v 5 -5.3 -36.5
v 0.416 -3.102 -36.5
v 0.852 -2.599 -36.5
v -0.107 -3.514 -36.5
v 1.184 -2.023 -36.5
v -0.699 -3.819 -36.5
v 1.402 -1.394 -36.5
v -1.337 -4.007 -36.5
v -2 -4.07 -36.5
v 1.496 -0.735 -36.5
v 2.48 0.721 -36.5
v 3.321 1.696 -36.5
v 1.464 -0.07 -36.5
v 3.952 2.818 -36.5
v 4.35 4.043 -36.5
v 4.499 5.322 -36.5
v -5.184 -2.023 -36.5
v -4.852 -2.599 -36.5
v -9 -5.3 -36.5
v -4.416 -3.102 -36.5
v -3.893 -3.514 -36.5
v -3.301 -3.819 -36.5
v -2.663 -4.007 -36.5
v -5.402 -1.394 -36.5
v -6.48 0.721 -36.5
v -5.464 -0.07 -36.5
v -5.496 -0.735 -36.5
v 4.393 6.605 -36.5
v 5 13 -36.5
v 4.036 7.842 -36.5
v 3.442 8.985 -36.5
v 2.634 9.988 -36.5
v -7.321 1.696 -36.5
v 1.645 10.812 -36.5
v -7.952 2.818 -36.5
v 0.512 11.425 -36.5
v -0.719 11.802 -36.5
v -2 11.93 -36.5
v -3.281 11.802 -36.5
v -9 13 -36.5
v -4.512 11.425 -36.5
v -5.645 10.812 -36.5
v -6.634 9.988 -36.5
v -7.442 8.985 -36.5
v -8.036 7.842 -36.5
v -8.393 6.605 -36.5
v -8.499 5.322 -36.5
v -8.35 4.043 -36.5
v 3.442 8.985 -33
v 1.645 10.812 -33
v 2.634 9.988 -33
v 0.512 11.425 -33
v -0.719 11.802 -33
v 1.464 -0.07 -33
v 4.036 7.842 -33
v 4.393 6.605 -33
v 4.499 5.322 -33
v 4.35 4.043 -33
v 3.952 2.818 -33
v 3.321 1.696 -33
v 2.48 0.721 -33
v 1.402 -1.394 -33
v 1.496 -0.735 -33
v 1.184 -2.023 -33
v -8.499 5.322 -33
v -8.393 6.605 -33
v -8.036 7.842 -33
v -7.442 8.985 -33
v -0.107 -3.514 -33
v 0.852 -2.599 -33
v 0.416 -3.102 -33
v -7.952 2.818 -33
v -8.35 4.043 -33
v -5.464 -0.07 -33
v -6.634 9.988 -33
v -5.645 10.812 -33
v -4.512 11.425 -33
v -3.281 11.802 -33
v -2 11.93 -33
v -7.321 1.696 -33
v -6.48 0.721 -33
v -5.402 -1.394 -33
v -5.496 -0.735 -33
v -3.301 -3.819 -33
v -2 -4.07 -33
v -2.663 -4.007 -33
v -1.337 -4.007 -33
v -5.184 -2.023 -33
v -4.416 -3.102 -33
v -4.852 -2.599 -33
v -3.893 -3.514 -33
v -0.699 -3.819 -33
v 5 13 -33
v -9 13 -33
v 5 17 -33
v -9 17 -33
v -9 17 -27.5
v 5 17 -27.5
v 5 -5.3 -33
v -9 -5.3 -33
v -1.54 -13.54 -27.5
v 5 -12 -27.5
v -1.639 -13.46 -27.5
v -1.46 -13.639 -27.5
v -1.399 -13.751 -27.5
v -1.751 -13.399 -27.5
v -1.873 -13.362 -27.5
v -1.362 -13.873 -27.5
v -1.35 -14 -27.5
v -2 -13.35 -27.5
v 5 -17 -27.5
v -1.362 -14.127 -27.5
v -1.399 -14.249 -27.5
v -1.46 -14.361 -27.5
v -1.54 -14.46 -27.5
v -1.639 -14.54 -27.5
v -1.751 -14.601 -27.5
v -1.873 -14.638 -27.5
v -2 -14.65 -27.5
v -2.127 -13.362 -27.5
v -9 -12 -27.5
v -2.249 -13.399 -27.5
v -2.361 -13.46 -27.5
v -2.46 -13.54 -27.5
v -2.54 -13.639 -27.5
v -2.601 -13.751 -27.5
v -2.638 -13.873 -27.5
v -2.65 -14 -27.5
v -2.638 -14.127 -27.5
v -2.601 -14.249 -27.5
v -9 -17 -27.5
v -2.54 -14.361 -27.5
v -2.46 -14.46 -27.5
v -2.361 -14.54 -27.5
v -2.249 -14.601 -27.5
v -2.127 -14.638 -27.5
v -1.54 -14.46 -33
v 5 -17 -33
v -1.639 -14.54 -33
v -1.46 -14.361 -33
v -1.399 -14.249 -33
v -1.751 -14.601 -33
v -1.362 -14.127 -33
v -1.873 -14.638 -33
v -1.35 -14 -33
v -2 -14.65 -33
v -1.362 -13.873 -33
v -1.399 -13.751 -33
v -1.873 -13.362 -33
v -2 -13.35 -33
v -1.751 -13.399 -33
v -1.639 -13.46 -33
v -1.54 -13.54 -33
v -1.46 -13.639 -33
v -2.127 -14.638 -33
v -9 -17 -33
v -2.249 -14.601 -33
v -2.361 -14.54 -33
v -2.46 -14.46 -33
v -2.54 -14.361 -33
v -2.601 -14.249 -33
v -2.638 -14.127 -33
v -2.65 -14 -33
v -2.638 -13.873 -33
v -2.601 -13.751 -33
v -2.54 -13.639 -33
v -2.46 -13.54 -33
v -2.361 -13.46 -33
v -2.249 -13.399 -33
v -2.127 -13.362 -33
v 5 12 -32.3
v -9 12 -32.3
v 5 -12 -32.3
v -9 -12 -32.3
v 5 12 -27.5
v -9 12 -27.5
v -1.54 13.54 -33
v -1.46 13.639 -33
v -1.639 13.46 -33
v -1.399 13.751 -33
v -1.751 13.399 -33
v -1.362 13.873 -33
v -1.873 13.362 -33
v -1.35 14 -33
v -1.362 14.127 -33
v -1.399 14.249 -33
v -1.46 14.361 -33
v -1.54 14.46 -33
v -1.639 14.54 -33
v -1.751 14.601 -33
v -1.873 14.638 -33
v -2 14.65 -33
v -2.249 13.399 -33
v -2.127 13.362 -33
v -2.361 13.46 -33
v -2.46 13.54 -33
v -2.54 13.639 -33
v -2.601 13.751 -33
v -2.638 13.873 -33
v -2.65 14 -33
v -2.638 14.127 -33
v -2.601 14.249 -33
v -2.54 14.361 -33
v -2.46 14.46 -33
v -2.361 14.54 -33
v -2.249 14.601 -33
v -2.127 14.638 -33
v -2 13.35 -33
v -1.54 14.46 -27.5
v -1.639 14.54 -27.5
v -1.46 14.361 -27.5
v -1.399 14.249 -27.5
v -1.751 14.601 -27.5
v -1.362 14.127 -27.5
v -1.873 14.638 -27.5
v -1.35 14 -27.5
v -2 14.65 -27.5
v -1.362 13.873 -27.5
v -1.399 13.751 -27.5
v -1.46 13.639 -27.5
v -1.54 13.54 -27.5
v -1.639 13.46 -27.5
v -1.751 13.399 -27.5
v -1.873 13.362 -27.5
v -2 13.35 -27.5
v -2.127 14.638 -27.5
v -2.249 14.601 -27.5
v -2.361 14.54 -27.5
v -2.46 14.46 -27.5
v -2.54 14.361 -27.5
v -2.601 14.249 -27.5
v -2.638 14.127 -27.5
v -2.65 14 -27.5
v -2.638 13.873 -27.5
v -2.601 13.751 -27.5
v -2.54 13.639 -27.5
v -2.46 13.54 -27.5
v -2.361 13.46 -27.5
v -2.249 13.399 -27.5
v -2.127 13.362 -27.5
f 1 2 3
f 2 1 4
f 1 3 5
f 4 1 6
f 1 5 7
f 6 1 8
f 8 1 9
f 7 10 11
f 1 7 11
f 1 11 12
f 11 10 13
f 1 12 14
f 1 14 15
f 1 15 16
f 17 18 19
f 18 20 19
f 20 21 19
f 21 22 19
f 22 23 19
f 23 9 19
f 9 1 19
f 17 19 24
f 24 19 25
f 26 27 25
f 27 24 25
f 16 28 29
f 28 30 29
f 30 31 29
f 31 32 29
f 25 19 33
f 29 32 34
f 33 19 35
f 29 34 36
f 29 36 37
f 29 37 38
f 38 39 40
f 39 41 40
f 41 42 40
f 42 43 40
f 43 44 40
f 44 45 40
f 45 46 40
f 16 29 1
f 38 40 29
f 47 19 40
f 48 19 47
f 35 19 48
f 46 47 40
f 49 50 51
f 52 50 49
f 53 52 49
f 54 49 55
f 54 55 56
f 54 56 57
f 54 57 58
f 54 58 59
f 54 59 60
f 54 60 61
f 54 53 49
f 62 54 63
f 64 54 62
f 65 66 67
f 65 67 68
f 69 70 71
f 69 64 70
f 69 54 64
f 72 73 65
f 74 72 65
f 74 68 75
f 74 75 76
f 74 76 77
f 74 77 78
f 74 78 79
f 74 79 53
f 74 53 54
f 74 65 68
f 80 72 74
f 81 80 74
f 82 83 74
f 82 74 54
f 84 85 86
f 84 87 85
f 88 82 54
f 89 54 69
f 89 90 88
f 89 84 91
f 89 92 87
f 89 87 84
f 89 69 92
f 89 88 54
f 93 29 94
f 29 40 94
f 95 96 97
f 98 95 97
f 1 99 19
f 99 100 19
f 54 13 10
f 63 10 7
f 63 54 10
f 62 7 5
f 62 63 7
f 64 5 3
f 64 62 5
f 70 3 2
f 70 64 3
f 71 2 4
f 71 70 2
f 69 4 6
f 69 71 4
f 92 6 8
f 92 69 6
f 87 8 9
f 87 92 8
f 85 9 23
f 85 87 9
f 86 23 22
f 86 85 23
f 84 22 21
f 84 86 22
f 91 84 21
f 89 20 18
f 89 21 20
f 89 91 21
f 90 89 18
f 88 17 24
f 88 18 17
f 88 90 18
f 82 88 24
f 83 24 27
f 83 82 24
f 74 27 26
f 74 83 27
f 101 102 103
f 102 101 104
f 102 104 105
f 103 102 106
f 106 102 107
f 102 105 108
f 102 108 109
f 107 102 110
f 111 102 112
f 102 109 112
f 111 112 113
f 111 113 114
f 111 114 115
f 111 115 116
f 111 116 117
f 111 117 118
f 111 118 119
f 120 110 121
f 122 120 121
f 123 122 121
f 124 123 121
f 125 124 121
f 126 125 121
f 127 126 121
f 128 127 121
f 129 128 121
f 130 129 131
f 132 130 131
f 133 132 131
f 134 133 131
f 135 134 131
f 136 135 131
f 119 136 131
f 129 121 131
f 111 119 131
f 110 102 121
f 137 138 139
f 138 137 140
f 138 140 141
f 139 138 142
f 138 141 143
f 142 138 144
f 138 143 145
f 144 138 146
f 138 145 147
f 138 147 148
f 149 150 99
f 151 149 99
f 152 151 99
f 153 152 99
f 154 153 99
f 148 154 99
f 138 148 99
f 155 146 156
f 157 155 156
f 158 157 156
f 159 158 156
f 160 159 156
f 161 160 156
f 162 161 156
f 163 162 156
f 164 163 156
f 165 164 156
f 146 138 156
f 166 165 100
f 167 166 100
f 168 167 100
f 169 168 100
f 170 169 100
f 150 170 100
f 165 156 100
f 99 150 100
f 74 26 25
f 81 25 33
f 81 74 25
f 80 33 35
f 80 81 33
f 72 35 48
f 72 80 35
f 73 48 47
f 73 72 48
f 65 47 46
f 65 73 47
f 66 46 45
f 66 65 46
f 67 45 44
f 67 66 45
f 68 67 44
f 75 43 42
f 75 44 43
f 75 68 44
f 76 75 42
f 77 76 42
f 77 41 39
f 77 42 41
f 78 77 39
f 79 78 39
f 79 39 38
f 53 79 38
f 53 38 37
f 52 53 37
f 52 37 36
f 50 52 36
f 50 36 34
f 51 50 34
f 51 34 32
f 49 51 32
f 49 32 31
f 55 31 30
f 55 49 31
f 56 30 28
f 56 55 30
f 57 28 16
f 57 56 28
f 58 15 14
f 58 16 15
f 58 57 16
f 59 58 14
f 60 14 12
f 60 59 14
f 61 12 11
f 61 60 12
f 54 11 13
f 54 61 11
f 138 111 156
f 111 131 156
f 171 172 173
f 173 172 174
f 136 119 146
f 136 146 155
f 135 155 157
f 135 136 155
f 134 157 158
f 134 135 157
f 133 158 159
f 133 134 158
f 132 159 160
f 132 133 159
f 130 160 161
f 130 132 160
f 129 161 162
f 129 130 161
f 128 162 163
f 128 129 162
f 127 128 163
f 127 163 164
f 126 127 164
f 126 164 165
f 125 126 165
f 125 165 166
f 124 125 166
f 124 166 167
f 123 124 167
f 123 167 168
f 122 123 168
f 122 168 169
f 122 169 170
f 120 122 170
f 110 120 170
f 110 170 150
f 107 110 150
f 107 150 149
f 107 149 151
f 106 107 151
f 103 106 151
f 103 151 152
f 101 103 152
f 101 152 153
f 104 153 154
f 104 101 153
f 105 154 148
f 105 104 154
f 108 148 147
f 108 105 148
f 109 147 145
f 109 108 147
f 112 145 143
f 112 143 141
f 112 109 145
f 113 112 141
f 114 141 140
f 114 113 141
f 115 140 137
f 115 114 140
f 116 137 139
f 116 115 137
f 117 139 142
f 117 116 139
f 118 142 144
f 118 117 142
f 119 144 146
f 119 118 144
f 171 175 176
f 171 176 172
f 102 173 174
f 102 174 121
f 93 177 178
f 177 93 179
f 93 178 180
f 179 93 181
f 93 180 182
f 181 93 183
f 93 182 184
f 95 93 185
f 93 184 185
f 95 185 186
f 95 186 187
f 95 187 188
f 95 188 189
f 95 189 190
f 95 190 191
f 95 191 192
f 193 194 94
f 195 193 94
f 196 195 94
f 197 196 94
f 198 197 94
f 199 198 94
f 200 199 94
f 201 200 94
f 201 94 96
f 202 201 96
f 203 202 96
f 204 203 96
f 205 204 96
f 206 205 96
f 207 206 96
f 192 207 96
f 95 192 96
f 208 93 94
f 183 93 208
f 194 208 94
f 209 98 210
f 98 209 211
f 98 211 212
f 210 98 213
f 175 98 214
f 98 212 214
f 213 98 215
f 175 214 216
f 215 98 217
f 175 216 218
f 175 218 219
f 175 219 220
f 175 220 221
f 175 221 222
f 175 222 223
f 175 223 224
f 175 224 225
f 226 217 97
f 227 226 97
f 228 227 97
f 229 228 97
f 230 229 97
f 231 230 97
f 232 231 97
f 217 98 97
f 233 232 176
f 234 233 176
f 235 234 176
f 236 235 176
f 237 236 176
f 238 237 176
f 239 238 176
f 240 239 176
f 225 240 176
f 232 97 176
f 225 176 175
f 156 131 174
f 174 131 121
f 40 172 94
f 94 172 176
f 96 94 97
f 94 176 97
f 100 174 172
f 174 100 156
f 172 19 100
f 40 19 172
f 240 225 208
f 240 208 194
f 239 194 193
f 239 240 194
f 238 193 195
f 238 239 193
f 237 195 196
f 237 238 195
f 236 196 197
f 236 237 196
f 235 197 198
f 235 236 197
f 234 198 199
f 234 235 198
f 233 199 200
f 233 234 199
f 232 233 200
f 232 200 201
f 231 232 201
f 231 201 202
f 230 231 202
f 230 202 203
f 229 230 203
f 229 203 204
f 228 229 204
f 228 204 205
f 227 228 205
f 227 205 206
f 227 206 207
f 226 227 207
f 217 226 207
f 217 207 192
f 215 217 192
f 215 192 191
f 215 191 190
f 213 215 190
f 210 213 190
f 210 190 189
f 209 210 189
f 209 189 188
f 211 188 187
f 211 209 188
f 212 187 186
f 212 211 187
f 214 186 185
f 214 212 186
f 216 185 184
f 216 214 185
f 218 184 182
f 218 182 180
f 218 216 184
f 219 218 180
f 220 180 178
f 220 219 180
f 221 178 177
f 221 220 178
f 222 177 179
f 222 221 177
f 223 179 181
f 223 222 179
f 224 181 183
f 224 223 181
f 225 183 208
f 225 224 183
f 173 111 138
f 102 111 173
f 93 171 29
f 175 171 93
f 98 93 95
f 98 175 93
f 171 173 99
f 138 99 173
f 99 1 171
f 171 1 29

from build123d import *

# Parameters (mm, degrees)
CYLINDER001_R          = 3.5
CYLINDER001_DEPTH      = 4
CYLINDER001_ROLL_ANGLE = 90
CYLINDER003_R          = 0.65
CYLINDER003_DEPTH      = 6
CYLINDER003_ROLL_ANGLE = 90
CYLINDER_R             = 6.5
CYLINDER_DEPTH         = 4
CYLINDER_ROLL_ANGLE    = 90
CYLINDER002_R          = 0.65
CYLINDER002_DEPTH      = 6
CYLINDER002_ROLL_ANGLE = 90
PAD002_DEPTH           = 7
CUT003_ROLL_ANGLE      = 90
CUT003_PLACEMENT_ANGLE = -90


with BuildPart() as cylinder001:
    # Cylinder001 → Cylinder001 (new body)
    with BuildSketch(Plane.XY):
        Circle(CYLINDER001_R)
    extrude(amount=CYLINDER001_DEPTH)


with BuildPart() as cylinder001_1:
    # Cylinder001 roll: moved
    add(cylinder001.part.rotate(Axis((0, 0, 0), (1, 0, 0)), CYLINDER001_ROLL_ANGLE))


with BuildPart() as cylinder001_2:
    # Cylinder001 placement: moved
    add(cylinder001_1.part.moved(Location((0.57, -7, 0))))


with BuildPart() as cylinder003:
    # Cylinder003 → Cylinder003 (new body)
    with BuildSketch(Plane.XY):
        Circle(CYLINDER003_R)
    extrude(amount=CYLINDER003_DEPTH)


with BuildPart() as cylinder003_1:
    # Cylinder003 roll: moved
    add(cylinder003.part.rotate(Axis((0, 0, 0), (1, 0, 0)), CYLINDER003_ROLL_ANGLE))


with BuildPart() as cylinder003_2:
    # Cylinder003 placement: moved
    add(cylinder003_1.part.moved(Location((14, -1, 0))))


with BuildPart() as cylinder:
    # Cylinder → Cylinder (new body)
    with BuildSketch(Plane.XY):
        Circle(CYLINDER_R)
    extrude(amount=CYLINDER_DEPTH)


with BuildPart() as cylinder_1:
    # Cylinder roll: moved
    add(cylinder.part.rotate(Axis((0, 0, 0), (1, 0, 0)), CYLINDER_ROLL_ANGLE))


with BuildPart() as cylinder_2:
    # Cylinder placement: moved
    add(cylinder_1.part.moved(Location((-5.43, -7, 0))))


with BuildPart() as fusion001:
    # Cylinder002 → Cylinder002 (new body)
    with BuildSketch(Plane.XY):
        Circle(CYLINDER002_R)
    extrude(amount=CYLINDER002_DEPTH)


with BuildPart() as fusion001_1:
    # Cylinder002 roll: moved
    add(fusion001.part.rotate(Axis((0, 0, 0), (1, 0, 0)), CYLINDER002_ROLL_ANGLE))


with BuildPart() as fusion001_2:
    # Cylinder002 placement: moved
    add(fusion001_1.part.moved(Location((-14, -1, 0))))

    # Fusion001: union Cylinder001, Cylinder003, Cylinder
    add(cylinder001_2.part)
    add(cylinder003_2.part)
    add(cylinder_2.part)


with BuildPart() as cut003:
    # Sketch → Pad002 (new body, symmetric)
    with BuildSketch(Plane.XY):
        Polygon((-17, -1.5), (-12, -1.5), (-12, -6.3), (12, -6.3), (12, -1.5), (17, -1.5), (17, -7), (5.3, -7), (5.3, -10.5), (-13, -10.5), (-13, -7), (-17, -7), align=None)
    extrude(amount=PAD002_DEPTH, both=True)

    # Cut003: cut Fusion001
    add(fusion001_2.part, mode=Mode.SUBTRACT)


with BuildPart() as cut003_1:
    # Cut003 roll: moved
    add(cut003.part.rotate(Axis((0, 0, 0), (1, 0, 0)), CUT003_ROLL_ANGLE))


with BuildPart() as cut003_2:
    # Cut003 placement: moved
    add(cut003_1.part.moved(Location((-2, 0, -26))).rotate(Axis((-2, 0, -26), (0, 0, 1)), CUT003_PLACEMENT_ANGLE))


solid = cut003_2.part
